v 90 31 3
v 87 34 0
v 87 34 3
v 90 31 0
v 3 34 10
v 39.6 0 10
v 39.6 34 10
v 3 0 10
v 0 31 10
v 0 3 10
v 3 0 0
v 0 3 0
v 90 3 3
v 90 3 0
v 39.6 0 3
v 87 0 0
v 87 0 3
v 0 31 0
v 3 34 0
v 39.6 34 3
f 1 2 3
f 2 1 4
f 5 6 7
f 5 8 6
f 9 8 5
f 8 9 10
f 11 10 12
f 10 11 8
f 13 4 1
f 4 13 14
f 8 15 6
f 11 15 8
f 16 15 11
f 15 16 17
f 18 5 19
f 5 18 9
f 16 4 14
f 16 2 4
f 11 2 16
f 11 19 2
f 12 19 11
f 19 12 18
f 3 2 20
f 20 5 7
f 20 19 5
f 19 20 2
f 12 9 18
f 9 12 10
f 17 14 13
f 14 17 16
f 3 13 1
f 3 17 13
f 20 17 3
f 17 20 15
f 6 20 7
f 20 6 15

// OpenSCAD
$fn = 32;

// ----------------------------------------------------------------------
// Stepped bar: endstep, 90 x 34 x 10/3 mm
// ----------------------------------------------------------------------

// --- parameters (mm) ---
bar_l = 90;               // bar length, X
bar_w = 34;               // bar width, Y
plate_t = 10;             // thickness of the thick zone, Z
thin_t = 3;               // thickness of the thin zone
corner_c = 3;             // corner chamfer of the bar
step_cut = 7;             // material removed from the thin zone
step_x = 39.6;            // step position from the left end
depth_1 = 7;              // depth of cut 1 from the top face

profile = [[3, 0], [87, 0], [90, 3], [90, 31], [87, 34], [3, 34], [0, 31], [0, 3]];  // primary outline, 8 points, counter clockwise
void_1 = [[39.6, -1], [91, -1], [91, 35], [39.6, 35]];  // thin zone beyond the step, 4 points

// --- the one profile operation ---
difference() {
  linear_extrude(height = plate_t) polygon(points = profile);
  translate([0, 0, plate_t - depth_1])
    linear_extrude(height = depth_1 + 1) polygon(points = void_1);
}
